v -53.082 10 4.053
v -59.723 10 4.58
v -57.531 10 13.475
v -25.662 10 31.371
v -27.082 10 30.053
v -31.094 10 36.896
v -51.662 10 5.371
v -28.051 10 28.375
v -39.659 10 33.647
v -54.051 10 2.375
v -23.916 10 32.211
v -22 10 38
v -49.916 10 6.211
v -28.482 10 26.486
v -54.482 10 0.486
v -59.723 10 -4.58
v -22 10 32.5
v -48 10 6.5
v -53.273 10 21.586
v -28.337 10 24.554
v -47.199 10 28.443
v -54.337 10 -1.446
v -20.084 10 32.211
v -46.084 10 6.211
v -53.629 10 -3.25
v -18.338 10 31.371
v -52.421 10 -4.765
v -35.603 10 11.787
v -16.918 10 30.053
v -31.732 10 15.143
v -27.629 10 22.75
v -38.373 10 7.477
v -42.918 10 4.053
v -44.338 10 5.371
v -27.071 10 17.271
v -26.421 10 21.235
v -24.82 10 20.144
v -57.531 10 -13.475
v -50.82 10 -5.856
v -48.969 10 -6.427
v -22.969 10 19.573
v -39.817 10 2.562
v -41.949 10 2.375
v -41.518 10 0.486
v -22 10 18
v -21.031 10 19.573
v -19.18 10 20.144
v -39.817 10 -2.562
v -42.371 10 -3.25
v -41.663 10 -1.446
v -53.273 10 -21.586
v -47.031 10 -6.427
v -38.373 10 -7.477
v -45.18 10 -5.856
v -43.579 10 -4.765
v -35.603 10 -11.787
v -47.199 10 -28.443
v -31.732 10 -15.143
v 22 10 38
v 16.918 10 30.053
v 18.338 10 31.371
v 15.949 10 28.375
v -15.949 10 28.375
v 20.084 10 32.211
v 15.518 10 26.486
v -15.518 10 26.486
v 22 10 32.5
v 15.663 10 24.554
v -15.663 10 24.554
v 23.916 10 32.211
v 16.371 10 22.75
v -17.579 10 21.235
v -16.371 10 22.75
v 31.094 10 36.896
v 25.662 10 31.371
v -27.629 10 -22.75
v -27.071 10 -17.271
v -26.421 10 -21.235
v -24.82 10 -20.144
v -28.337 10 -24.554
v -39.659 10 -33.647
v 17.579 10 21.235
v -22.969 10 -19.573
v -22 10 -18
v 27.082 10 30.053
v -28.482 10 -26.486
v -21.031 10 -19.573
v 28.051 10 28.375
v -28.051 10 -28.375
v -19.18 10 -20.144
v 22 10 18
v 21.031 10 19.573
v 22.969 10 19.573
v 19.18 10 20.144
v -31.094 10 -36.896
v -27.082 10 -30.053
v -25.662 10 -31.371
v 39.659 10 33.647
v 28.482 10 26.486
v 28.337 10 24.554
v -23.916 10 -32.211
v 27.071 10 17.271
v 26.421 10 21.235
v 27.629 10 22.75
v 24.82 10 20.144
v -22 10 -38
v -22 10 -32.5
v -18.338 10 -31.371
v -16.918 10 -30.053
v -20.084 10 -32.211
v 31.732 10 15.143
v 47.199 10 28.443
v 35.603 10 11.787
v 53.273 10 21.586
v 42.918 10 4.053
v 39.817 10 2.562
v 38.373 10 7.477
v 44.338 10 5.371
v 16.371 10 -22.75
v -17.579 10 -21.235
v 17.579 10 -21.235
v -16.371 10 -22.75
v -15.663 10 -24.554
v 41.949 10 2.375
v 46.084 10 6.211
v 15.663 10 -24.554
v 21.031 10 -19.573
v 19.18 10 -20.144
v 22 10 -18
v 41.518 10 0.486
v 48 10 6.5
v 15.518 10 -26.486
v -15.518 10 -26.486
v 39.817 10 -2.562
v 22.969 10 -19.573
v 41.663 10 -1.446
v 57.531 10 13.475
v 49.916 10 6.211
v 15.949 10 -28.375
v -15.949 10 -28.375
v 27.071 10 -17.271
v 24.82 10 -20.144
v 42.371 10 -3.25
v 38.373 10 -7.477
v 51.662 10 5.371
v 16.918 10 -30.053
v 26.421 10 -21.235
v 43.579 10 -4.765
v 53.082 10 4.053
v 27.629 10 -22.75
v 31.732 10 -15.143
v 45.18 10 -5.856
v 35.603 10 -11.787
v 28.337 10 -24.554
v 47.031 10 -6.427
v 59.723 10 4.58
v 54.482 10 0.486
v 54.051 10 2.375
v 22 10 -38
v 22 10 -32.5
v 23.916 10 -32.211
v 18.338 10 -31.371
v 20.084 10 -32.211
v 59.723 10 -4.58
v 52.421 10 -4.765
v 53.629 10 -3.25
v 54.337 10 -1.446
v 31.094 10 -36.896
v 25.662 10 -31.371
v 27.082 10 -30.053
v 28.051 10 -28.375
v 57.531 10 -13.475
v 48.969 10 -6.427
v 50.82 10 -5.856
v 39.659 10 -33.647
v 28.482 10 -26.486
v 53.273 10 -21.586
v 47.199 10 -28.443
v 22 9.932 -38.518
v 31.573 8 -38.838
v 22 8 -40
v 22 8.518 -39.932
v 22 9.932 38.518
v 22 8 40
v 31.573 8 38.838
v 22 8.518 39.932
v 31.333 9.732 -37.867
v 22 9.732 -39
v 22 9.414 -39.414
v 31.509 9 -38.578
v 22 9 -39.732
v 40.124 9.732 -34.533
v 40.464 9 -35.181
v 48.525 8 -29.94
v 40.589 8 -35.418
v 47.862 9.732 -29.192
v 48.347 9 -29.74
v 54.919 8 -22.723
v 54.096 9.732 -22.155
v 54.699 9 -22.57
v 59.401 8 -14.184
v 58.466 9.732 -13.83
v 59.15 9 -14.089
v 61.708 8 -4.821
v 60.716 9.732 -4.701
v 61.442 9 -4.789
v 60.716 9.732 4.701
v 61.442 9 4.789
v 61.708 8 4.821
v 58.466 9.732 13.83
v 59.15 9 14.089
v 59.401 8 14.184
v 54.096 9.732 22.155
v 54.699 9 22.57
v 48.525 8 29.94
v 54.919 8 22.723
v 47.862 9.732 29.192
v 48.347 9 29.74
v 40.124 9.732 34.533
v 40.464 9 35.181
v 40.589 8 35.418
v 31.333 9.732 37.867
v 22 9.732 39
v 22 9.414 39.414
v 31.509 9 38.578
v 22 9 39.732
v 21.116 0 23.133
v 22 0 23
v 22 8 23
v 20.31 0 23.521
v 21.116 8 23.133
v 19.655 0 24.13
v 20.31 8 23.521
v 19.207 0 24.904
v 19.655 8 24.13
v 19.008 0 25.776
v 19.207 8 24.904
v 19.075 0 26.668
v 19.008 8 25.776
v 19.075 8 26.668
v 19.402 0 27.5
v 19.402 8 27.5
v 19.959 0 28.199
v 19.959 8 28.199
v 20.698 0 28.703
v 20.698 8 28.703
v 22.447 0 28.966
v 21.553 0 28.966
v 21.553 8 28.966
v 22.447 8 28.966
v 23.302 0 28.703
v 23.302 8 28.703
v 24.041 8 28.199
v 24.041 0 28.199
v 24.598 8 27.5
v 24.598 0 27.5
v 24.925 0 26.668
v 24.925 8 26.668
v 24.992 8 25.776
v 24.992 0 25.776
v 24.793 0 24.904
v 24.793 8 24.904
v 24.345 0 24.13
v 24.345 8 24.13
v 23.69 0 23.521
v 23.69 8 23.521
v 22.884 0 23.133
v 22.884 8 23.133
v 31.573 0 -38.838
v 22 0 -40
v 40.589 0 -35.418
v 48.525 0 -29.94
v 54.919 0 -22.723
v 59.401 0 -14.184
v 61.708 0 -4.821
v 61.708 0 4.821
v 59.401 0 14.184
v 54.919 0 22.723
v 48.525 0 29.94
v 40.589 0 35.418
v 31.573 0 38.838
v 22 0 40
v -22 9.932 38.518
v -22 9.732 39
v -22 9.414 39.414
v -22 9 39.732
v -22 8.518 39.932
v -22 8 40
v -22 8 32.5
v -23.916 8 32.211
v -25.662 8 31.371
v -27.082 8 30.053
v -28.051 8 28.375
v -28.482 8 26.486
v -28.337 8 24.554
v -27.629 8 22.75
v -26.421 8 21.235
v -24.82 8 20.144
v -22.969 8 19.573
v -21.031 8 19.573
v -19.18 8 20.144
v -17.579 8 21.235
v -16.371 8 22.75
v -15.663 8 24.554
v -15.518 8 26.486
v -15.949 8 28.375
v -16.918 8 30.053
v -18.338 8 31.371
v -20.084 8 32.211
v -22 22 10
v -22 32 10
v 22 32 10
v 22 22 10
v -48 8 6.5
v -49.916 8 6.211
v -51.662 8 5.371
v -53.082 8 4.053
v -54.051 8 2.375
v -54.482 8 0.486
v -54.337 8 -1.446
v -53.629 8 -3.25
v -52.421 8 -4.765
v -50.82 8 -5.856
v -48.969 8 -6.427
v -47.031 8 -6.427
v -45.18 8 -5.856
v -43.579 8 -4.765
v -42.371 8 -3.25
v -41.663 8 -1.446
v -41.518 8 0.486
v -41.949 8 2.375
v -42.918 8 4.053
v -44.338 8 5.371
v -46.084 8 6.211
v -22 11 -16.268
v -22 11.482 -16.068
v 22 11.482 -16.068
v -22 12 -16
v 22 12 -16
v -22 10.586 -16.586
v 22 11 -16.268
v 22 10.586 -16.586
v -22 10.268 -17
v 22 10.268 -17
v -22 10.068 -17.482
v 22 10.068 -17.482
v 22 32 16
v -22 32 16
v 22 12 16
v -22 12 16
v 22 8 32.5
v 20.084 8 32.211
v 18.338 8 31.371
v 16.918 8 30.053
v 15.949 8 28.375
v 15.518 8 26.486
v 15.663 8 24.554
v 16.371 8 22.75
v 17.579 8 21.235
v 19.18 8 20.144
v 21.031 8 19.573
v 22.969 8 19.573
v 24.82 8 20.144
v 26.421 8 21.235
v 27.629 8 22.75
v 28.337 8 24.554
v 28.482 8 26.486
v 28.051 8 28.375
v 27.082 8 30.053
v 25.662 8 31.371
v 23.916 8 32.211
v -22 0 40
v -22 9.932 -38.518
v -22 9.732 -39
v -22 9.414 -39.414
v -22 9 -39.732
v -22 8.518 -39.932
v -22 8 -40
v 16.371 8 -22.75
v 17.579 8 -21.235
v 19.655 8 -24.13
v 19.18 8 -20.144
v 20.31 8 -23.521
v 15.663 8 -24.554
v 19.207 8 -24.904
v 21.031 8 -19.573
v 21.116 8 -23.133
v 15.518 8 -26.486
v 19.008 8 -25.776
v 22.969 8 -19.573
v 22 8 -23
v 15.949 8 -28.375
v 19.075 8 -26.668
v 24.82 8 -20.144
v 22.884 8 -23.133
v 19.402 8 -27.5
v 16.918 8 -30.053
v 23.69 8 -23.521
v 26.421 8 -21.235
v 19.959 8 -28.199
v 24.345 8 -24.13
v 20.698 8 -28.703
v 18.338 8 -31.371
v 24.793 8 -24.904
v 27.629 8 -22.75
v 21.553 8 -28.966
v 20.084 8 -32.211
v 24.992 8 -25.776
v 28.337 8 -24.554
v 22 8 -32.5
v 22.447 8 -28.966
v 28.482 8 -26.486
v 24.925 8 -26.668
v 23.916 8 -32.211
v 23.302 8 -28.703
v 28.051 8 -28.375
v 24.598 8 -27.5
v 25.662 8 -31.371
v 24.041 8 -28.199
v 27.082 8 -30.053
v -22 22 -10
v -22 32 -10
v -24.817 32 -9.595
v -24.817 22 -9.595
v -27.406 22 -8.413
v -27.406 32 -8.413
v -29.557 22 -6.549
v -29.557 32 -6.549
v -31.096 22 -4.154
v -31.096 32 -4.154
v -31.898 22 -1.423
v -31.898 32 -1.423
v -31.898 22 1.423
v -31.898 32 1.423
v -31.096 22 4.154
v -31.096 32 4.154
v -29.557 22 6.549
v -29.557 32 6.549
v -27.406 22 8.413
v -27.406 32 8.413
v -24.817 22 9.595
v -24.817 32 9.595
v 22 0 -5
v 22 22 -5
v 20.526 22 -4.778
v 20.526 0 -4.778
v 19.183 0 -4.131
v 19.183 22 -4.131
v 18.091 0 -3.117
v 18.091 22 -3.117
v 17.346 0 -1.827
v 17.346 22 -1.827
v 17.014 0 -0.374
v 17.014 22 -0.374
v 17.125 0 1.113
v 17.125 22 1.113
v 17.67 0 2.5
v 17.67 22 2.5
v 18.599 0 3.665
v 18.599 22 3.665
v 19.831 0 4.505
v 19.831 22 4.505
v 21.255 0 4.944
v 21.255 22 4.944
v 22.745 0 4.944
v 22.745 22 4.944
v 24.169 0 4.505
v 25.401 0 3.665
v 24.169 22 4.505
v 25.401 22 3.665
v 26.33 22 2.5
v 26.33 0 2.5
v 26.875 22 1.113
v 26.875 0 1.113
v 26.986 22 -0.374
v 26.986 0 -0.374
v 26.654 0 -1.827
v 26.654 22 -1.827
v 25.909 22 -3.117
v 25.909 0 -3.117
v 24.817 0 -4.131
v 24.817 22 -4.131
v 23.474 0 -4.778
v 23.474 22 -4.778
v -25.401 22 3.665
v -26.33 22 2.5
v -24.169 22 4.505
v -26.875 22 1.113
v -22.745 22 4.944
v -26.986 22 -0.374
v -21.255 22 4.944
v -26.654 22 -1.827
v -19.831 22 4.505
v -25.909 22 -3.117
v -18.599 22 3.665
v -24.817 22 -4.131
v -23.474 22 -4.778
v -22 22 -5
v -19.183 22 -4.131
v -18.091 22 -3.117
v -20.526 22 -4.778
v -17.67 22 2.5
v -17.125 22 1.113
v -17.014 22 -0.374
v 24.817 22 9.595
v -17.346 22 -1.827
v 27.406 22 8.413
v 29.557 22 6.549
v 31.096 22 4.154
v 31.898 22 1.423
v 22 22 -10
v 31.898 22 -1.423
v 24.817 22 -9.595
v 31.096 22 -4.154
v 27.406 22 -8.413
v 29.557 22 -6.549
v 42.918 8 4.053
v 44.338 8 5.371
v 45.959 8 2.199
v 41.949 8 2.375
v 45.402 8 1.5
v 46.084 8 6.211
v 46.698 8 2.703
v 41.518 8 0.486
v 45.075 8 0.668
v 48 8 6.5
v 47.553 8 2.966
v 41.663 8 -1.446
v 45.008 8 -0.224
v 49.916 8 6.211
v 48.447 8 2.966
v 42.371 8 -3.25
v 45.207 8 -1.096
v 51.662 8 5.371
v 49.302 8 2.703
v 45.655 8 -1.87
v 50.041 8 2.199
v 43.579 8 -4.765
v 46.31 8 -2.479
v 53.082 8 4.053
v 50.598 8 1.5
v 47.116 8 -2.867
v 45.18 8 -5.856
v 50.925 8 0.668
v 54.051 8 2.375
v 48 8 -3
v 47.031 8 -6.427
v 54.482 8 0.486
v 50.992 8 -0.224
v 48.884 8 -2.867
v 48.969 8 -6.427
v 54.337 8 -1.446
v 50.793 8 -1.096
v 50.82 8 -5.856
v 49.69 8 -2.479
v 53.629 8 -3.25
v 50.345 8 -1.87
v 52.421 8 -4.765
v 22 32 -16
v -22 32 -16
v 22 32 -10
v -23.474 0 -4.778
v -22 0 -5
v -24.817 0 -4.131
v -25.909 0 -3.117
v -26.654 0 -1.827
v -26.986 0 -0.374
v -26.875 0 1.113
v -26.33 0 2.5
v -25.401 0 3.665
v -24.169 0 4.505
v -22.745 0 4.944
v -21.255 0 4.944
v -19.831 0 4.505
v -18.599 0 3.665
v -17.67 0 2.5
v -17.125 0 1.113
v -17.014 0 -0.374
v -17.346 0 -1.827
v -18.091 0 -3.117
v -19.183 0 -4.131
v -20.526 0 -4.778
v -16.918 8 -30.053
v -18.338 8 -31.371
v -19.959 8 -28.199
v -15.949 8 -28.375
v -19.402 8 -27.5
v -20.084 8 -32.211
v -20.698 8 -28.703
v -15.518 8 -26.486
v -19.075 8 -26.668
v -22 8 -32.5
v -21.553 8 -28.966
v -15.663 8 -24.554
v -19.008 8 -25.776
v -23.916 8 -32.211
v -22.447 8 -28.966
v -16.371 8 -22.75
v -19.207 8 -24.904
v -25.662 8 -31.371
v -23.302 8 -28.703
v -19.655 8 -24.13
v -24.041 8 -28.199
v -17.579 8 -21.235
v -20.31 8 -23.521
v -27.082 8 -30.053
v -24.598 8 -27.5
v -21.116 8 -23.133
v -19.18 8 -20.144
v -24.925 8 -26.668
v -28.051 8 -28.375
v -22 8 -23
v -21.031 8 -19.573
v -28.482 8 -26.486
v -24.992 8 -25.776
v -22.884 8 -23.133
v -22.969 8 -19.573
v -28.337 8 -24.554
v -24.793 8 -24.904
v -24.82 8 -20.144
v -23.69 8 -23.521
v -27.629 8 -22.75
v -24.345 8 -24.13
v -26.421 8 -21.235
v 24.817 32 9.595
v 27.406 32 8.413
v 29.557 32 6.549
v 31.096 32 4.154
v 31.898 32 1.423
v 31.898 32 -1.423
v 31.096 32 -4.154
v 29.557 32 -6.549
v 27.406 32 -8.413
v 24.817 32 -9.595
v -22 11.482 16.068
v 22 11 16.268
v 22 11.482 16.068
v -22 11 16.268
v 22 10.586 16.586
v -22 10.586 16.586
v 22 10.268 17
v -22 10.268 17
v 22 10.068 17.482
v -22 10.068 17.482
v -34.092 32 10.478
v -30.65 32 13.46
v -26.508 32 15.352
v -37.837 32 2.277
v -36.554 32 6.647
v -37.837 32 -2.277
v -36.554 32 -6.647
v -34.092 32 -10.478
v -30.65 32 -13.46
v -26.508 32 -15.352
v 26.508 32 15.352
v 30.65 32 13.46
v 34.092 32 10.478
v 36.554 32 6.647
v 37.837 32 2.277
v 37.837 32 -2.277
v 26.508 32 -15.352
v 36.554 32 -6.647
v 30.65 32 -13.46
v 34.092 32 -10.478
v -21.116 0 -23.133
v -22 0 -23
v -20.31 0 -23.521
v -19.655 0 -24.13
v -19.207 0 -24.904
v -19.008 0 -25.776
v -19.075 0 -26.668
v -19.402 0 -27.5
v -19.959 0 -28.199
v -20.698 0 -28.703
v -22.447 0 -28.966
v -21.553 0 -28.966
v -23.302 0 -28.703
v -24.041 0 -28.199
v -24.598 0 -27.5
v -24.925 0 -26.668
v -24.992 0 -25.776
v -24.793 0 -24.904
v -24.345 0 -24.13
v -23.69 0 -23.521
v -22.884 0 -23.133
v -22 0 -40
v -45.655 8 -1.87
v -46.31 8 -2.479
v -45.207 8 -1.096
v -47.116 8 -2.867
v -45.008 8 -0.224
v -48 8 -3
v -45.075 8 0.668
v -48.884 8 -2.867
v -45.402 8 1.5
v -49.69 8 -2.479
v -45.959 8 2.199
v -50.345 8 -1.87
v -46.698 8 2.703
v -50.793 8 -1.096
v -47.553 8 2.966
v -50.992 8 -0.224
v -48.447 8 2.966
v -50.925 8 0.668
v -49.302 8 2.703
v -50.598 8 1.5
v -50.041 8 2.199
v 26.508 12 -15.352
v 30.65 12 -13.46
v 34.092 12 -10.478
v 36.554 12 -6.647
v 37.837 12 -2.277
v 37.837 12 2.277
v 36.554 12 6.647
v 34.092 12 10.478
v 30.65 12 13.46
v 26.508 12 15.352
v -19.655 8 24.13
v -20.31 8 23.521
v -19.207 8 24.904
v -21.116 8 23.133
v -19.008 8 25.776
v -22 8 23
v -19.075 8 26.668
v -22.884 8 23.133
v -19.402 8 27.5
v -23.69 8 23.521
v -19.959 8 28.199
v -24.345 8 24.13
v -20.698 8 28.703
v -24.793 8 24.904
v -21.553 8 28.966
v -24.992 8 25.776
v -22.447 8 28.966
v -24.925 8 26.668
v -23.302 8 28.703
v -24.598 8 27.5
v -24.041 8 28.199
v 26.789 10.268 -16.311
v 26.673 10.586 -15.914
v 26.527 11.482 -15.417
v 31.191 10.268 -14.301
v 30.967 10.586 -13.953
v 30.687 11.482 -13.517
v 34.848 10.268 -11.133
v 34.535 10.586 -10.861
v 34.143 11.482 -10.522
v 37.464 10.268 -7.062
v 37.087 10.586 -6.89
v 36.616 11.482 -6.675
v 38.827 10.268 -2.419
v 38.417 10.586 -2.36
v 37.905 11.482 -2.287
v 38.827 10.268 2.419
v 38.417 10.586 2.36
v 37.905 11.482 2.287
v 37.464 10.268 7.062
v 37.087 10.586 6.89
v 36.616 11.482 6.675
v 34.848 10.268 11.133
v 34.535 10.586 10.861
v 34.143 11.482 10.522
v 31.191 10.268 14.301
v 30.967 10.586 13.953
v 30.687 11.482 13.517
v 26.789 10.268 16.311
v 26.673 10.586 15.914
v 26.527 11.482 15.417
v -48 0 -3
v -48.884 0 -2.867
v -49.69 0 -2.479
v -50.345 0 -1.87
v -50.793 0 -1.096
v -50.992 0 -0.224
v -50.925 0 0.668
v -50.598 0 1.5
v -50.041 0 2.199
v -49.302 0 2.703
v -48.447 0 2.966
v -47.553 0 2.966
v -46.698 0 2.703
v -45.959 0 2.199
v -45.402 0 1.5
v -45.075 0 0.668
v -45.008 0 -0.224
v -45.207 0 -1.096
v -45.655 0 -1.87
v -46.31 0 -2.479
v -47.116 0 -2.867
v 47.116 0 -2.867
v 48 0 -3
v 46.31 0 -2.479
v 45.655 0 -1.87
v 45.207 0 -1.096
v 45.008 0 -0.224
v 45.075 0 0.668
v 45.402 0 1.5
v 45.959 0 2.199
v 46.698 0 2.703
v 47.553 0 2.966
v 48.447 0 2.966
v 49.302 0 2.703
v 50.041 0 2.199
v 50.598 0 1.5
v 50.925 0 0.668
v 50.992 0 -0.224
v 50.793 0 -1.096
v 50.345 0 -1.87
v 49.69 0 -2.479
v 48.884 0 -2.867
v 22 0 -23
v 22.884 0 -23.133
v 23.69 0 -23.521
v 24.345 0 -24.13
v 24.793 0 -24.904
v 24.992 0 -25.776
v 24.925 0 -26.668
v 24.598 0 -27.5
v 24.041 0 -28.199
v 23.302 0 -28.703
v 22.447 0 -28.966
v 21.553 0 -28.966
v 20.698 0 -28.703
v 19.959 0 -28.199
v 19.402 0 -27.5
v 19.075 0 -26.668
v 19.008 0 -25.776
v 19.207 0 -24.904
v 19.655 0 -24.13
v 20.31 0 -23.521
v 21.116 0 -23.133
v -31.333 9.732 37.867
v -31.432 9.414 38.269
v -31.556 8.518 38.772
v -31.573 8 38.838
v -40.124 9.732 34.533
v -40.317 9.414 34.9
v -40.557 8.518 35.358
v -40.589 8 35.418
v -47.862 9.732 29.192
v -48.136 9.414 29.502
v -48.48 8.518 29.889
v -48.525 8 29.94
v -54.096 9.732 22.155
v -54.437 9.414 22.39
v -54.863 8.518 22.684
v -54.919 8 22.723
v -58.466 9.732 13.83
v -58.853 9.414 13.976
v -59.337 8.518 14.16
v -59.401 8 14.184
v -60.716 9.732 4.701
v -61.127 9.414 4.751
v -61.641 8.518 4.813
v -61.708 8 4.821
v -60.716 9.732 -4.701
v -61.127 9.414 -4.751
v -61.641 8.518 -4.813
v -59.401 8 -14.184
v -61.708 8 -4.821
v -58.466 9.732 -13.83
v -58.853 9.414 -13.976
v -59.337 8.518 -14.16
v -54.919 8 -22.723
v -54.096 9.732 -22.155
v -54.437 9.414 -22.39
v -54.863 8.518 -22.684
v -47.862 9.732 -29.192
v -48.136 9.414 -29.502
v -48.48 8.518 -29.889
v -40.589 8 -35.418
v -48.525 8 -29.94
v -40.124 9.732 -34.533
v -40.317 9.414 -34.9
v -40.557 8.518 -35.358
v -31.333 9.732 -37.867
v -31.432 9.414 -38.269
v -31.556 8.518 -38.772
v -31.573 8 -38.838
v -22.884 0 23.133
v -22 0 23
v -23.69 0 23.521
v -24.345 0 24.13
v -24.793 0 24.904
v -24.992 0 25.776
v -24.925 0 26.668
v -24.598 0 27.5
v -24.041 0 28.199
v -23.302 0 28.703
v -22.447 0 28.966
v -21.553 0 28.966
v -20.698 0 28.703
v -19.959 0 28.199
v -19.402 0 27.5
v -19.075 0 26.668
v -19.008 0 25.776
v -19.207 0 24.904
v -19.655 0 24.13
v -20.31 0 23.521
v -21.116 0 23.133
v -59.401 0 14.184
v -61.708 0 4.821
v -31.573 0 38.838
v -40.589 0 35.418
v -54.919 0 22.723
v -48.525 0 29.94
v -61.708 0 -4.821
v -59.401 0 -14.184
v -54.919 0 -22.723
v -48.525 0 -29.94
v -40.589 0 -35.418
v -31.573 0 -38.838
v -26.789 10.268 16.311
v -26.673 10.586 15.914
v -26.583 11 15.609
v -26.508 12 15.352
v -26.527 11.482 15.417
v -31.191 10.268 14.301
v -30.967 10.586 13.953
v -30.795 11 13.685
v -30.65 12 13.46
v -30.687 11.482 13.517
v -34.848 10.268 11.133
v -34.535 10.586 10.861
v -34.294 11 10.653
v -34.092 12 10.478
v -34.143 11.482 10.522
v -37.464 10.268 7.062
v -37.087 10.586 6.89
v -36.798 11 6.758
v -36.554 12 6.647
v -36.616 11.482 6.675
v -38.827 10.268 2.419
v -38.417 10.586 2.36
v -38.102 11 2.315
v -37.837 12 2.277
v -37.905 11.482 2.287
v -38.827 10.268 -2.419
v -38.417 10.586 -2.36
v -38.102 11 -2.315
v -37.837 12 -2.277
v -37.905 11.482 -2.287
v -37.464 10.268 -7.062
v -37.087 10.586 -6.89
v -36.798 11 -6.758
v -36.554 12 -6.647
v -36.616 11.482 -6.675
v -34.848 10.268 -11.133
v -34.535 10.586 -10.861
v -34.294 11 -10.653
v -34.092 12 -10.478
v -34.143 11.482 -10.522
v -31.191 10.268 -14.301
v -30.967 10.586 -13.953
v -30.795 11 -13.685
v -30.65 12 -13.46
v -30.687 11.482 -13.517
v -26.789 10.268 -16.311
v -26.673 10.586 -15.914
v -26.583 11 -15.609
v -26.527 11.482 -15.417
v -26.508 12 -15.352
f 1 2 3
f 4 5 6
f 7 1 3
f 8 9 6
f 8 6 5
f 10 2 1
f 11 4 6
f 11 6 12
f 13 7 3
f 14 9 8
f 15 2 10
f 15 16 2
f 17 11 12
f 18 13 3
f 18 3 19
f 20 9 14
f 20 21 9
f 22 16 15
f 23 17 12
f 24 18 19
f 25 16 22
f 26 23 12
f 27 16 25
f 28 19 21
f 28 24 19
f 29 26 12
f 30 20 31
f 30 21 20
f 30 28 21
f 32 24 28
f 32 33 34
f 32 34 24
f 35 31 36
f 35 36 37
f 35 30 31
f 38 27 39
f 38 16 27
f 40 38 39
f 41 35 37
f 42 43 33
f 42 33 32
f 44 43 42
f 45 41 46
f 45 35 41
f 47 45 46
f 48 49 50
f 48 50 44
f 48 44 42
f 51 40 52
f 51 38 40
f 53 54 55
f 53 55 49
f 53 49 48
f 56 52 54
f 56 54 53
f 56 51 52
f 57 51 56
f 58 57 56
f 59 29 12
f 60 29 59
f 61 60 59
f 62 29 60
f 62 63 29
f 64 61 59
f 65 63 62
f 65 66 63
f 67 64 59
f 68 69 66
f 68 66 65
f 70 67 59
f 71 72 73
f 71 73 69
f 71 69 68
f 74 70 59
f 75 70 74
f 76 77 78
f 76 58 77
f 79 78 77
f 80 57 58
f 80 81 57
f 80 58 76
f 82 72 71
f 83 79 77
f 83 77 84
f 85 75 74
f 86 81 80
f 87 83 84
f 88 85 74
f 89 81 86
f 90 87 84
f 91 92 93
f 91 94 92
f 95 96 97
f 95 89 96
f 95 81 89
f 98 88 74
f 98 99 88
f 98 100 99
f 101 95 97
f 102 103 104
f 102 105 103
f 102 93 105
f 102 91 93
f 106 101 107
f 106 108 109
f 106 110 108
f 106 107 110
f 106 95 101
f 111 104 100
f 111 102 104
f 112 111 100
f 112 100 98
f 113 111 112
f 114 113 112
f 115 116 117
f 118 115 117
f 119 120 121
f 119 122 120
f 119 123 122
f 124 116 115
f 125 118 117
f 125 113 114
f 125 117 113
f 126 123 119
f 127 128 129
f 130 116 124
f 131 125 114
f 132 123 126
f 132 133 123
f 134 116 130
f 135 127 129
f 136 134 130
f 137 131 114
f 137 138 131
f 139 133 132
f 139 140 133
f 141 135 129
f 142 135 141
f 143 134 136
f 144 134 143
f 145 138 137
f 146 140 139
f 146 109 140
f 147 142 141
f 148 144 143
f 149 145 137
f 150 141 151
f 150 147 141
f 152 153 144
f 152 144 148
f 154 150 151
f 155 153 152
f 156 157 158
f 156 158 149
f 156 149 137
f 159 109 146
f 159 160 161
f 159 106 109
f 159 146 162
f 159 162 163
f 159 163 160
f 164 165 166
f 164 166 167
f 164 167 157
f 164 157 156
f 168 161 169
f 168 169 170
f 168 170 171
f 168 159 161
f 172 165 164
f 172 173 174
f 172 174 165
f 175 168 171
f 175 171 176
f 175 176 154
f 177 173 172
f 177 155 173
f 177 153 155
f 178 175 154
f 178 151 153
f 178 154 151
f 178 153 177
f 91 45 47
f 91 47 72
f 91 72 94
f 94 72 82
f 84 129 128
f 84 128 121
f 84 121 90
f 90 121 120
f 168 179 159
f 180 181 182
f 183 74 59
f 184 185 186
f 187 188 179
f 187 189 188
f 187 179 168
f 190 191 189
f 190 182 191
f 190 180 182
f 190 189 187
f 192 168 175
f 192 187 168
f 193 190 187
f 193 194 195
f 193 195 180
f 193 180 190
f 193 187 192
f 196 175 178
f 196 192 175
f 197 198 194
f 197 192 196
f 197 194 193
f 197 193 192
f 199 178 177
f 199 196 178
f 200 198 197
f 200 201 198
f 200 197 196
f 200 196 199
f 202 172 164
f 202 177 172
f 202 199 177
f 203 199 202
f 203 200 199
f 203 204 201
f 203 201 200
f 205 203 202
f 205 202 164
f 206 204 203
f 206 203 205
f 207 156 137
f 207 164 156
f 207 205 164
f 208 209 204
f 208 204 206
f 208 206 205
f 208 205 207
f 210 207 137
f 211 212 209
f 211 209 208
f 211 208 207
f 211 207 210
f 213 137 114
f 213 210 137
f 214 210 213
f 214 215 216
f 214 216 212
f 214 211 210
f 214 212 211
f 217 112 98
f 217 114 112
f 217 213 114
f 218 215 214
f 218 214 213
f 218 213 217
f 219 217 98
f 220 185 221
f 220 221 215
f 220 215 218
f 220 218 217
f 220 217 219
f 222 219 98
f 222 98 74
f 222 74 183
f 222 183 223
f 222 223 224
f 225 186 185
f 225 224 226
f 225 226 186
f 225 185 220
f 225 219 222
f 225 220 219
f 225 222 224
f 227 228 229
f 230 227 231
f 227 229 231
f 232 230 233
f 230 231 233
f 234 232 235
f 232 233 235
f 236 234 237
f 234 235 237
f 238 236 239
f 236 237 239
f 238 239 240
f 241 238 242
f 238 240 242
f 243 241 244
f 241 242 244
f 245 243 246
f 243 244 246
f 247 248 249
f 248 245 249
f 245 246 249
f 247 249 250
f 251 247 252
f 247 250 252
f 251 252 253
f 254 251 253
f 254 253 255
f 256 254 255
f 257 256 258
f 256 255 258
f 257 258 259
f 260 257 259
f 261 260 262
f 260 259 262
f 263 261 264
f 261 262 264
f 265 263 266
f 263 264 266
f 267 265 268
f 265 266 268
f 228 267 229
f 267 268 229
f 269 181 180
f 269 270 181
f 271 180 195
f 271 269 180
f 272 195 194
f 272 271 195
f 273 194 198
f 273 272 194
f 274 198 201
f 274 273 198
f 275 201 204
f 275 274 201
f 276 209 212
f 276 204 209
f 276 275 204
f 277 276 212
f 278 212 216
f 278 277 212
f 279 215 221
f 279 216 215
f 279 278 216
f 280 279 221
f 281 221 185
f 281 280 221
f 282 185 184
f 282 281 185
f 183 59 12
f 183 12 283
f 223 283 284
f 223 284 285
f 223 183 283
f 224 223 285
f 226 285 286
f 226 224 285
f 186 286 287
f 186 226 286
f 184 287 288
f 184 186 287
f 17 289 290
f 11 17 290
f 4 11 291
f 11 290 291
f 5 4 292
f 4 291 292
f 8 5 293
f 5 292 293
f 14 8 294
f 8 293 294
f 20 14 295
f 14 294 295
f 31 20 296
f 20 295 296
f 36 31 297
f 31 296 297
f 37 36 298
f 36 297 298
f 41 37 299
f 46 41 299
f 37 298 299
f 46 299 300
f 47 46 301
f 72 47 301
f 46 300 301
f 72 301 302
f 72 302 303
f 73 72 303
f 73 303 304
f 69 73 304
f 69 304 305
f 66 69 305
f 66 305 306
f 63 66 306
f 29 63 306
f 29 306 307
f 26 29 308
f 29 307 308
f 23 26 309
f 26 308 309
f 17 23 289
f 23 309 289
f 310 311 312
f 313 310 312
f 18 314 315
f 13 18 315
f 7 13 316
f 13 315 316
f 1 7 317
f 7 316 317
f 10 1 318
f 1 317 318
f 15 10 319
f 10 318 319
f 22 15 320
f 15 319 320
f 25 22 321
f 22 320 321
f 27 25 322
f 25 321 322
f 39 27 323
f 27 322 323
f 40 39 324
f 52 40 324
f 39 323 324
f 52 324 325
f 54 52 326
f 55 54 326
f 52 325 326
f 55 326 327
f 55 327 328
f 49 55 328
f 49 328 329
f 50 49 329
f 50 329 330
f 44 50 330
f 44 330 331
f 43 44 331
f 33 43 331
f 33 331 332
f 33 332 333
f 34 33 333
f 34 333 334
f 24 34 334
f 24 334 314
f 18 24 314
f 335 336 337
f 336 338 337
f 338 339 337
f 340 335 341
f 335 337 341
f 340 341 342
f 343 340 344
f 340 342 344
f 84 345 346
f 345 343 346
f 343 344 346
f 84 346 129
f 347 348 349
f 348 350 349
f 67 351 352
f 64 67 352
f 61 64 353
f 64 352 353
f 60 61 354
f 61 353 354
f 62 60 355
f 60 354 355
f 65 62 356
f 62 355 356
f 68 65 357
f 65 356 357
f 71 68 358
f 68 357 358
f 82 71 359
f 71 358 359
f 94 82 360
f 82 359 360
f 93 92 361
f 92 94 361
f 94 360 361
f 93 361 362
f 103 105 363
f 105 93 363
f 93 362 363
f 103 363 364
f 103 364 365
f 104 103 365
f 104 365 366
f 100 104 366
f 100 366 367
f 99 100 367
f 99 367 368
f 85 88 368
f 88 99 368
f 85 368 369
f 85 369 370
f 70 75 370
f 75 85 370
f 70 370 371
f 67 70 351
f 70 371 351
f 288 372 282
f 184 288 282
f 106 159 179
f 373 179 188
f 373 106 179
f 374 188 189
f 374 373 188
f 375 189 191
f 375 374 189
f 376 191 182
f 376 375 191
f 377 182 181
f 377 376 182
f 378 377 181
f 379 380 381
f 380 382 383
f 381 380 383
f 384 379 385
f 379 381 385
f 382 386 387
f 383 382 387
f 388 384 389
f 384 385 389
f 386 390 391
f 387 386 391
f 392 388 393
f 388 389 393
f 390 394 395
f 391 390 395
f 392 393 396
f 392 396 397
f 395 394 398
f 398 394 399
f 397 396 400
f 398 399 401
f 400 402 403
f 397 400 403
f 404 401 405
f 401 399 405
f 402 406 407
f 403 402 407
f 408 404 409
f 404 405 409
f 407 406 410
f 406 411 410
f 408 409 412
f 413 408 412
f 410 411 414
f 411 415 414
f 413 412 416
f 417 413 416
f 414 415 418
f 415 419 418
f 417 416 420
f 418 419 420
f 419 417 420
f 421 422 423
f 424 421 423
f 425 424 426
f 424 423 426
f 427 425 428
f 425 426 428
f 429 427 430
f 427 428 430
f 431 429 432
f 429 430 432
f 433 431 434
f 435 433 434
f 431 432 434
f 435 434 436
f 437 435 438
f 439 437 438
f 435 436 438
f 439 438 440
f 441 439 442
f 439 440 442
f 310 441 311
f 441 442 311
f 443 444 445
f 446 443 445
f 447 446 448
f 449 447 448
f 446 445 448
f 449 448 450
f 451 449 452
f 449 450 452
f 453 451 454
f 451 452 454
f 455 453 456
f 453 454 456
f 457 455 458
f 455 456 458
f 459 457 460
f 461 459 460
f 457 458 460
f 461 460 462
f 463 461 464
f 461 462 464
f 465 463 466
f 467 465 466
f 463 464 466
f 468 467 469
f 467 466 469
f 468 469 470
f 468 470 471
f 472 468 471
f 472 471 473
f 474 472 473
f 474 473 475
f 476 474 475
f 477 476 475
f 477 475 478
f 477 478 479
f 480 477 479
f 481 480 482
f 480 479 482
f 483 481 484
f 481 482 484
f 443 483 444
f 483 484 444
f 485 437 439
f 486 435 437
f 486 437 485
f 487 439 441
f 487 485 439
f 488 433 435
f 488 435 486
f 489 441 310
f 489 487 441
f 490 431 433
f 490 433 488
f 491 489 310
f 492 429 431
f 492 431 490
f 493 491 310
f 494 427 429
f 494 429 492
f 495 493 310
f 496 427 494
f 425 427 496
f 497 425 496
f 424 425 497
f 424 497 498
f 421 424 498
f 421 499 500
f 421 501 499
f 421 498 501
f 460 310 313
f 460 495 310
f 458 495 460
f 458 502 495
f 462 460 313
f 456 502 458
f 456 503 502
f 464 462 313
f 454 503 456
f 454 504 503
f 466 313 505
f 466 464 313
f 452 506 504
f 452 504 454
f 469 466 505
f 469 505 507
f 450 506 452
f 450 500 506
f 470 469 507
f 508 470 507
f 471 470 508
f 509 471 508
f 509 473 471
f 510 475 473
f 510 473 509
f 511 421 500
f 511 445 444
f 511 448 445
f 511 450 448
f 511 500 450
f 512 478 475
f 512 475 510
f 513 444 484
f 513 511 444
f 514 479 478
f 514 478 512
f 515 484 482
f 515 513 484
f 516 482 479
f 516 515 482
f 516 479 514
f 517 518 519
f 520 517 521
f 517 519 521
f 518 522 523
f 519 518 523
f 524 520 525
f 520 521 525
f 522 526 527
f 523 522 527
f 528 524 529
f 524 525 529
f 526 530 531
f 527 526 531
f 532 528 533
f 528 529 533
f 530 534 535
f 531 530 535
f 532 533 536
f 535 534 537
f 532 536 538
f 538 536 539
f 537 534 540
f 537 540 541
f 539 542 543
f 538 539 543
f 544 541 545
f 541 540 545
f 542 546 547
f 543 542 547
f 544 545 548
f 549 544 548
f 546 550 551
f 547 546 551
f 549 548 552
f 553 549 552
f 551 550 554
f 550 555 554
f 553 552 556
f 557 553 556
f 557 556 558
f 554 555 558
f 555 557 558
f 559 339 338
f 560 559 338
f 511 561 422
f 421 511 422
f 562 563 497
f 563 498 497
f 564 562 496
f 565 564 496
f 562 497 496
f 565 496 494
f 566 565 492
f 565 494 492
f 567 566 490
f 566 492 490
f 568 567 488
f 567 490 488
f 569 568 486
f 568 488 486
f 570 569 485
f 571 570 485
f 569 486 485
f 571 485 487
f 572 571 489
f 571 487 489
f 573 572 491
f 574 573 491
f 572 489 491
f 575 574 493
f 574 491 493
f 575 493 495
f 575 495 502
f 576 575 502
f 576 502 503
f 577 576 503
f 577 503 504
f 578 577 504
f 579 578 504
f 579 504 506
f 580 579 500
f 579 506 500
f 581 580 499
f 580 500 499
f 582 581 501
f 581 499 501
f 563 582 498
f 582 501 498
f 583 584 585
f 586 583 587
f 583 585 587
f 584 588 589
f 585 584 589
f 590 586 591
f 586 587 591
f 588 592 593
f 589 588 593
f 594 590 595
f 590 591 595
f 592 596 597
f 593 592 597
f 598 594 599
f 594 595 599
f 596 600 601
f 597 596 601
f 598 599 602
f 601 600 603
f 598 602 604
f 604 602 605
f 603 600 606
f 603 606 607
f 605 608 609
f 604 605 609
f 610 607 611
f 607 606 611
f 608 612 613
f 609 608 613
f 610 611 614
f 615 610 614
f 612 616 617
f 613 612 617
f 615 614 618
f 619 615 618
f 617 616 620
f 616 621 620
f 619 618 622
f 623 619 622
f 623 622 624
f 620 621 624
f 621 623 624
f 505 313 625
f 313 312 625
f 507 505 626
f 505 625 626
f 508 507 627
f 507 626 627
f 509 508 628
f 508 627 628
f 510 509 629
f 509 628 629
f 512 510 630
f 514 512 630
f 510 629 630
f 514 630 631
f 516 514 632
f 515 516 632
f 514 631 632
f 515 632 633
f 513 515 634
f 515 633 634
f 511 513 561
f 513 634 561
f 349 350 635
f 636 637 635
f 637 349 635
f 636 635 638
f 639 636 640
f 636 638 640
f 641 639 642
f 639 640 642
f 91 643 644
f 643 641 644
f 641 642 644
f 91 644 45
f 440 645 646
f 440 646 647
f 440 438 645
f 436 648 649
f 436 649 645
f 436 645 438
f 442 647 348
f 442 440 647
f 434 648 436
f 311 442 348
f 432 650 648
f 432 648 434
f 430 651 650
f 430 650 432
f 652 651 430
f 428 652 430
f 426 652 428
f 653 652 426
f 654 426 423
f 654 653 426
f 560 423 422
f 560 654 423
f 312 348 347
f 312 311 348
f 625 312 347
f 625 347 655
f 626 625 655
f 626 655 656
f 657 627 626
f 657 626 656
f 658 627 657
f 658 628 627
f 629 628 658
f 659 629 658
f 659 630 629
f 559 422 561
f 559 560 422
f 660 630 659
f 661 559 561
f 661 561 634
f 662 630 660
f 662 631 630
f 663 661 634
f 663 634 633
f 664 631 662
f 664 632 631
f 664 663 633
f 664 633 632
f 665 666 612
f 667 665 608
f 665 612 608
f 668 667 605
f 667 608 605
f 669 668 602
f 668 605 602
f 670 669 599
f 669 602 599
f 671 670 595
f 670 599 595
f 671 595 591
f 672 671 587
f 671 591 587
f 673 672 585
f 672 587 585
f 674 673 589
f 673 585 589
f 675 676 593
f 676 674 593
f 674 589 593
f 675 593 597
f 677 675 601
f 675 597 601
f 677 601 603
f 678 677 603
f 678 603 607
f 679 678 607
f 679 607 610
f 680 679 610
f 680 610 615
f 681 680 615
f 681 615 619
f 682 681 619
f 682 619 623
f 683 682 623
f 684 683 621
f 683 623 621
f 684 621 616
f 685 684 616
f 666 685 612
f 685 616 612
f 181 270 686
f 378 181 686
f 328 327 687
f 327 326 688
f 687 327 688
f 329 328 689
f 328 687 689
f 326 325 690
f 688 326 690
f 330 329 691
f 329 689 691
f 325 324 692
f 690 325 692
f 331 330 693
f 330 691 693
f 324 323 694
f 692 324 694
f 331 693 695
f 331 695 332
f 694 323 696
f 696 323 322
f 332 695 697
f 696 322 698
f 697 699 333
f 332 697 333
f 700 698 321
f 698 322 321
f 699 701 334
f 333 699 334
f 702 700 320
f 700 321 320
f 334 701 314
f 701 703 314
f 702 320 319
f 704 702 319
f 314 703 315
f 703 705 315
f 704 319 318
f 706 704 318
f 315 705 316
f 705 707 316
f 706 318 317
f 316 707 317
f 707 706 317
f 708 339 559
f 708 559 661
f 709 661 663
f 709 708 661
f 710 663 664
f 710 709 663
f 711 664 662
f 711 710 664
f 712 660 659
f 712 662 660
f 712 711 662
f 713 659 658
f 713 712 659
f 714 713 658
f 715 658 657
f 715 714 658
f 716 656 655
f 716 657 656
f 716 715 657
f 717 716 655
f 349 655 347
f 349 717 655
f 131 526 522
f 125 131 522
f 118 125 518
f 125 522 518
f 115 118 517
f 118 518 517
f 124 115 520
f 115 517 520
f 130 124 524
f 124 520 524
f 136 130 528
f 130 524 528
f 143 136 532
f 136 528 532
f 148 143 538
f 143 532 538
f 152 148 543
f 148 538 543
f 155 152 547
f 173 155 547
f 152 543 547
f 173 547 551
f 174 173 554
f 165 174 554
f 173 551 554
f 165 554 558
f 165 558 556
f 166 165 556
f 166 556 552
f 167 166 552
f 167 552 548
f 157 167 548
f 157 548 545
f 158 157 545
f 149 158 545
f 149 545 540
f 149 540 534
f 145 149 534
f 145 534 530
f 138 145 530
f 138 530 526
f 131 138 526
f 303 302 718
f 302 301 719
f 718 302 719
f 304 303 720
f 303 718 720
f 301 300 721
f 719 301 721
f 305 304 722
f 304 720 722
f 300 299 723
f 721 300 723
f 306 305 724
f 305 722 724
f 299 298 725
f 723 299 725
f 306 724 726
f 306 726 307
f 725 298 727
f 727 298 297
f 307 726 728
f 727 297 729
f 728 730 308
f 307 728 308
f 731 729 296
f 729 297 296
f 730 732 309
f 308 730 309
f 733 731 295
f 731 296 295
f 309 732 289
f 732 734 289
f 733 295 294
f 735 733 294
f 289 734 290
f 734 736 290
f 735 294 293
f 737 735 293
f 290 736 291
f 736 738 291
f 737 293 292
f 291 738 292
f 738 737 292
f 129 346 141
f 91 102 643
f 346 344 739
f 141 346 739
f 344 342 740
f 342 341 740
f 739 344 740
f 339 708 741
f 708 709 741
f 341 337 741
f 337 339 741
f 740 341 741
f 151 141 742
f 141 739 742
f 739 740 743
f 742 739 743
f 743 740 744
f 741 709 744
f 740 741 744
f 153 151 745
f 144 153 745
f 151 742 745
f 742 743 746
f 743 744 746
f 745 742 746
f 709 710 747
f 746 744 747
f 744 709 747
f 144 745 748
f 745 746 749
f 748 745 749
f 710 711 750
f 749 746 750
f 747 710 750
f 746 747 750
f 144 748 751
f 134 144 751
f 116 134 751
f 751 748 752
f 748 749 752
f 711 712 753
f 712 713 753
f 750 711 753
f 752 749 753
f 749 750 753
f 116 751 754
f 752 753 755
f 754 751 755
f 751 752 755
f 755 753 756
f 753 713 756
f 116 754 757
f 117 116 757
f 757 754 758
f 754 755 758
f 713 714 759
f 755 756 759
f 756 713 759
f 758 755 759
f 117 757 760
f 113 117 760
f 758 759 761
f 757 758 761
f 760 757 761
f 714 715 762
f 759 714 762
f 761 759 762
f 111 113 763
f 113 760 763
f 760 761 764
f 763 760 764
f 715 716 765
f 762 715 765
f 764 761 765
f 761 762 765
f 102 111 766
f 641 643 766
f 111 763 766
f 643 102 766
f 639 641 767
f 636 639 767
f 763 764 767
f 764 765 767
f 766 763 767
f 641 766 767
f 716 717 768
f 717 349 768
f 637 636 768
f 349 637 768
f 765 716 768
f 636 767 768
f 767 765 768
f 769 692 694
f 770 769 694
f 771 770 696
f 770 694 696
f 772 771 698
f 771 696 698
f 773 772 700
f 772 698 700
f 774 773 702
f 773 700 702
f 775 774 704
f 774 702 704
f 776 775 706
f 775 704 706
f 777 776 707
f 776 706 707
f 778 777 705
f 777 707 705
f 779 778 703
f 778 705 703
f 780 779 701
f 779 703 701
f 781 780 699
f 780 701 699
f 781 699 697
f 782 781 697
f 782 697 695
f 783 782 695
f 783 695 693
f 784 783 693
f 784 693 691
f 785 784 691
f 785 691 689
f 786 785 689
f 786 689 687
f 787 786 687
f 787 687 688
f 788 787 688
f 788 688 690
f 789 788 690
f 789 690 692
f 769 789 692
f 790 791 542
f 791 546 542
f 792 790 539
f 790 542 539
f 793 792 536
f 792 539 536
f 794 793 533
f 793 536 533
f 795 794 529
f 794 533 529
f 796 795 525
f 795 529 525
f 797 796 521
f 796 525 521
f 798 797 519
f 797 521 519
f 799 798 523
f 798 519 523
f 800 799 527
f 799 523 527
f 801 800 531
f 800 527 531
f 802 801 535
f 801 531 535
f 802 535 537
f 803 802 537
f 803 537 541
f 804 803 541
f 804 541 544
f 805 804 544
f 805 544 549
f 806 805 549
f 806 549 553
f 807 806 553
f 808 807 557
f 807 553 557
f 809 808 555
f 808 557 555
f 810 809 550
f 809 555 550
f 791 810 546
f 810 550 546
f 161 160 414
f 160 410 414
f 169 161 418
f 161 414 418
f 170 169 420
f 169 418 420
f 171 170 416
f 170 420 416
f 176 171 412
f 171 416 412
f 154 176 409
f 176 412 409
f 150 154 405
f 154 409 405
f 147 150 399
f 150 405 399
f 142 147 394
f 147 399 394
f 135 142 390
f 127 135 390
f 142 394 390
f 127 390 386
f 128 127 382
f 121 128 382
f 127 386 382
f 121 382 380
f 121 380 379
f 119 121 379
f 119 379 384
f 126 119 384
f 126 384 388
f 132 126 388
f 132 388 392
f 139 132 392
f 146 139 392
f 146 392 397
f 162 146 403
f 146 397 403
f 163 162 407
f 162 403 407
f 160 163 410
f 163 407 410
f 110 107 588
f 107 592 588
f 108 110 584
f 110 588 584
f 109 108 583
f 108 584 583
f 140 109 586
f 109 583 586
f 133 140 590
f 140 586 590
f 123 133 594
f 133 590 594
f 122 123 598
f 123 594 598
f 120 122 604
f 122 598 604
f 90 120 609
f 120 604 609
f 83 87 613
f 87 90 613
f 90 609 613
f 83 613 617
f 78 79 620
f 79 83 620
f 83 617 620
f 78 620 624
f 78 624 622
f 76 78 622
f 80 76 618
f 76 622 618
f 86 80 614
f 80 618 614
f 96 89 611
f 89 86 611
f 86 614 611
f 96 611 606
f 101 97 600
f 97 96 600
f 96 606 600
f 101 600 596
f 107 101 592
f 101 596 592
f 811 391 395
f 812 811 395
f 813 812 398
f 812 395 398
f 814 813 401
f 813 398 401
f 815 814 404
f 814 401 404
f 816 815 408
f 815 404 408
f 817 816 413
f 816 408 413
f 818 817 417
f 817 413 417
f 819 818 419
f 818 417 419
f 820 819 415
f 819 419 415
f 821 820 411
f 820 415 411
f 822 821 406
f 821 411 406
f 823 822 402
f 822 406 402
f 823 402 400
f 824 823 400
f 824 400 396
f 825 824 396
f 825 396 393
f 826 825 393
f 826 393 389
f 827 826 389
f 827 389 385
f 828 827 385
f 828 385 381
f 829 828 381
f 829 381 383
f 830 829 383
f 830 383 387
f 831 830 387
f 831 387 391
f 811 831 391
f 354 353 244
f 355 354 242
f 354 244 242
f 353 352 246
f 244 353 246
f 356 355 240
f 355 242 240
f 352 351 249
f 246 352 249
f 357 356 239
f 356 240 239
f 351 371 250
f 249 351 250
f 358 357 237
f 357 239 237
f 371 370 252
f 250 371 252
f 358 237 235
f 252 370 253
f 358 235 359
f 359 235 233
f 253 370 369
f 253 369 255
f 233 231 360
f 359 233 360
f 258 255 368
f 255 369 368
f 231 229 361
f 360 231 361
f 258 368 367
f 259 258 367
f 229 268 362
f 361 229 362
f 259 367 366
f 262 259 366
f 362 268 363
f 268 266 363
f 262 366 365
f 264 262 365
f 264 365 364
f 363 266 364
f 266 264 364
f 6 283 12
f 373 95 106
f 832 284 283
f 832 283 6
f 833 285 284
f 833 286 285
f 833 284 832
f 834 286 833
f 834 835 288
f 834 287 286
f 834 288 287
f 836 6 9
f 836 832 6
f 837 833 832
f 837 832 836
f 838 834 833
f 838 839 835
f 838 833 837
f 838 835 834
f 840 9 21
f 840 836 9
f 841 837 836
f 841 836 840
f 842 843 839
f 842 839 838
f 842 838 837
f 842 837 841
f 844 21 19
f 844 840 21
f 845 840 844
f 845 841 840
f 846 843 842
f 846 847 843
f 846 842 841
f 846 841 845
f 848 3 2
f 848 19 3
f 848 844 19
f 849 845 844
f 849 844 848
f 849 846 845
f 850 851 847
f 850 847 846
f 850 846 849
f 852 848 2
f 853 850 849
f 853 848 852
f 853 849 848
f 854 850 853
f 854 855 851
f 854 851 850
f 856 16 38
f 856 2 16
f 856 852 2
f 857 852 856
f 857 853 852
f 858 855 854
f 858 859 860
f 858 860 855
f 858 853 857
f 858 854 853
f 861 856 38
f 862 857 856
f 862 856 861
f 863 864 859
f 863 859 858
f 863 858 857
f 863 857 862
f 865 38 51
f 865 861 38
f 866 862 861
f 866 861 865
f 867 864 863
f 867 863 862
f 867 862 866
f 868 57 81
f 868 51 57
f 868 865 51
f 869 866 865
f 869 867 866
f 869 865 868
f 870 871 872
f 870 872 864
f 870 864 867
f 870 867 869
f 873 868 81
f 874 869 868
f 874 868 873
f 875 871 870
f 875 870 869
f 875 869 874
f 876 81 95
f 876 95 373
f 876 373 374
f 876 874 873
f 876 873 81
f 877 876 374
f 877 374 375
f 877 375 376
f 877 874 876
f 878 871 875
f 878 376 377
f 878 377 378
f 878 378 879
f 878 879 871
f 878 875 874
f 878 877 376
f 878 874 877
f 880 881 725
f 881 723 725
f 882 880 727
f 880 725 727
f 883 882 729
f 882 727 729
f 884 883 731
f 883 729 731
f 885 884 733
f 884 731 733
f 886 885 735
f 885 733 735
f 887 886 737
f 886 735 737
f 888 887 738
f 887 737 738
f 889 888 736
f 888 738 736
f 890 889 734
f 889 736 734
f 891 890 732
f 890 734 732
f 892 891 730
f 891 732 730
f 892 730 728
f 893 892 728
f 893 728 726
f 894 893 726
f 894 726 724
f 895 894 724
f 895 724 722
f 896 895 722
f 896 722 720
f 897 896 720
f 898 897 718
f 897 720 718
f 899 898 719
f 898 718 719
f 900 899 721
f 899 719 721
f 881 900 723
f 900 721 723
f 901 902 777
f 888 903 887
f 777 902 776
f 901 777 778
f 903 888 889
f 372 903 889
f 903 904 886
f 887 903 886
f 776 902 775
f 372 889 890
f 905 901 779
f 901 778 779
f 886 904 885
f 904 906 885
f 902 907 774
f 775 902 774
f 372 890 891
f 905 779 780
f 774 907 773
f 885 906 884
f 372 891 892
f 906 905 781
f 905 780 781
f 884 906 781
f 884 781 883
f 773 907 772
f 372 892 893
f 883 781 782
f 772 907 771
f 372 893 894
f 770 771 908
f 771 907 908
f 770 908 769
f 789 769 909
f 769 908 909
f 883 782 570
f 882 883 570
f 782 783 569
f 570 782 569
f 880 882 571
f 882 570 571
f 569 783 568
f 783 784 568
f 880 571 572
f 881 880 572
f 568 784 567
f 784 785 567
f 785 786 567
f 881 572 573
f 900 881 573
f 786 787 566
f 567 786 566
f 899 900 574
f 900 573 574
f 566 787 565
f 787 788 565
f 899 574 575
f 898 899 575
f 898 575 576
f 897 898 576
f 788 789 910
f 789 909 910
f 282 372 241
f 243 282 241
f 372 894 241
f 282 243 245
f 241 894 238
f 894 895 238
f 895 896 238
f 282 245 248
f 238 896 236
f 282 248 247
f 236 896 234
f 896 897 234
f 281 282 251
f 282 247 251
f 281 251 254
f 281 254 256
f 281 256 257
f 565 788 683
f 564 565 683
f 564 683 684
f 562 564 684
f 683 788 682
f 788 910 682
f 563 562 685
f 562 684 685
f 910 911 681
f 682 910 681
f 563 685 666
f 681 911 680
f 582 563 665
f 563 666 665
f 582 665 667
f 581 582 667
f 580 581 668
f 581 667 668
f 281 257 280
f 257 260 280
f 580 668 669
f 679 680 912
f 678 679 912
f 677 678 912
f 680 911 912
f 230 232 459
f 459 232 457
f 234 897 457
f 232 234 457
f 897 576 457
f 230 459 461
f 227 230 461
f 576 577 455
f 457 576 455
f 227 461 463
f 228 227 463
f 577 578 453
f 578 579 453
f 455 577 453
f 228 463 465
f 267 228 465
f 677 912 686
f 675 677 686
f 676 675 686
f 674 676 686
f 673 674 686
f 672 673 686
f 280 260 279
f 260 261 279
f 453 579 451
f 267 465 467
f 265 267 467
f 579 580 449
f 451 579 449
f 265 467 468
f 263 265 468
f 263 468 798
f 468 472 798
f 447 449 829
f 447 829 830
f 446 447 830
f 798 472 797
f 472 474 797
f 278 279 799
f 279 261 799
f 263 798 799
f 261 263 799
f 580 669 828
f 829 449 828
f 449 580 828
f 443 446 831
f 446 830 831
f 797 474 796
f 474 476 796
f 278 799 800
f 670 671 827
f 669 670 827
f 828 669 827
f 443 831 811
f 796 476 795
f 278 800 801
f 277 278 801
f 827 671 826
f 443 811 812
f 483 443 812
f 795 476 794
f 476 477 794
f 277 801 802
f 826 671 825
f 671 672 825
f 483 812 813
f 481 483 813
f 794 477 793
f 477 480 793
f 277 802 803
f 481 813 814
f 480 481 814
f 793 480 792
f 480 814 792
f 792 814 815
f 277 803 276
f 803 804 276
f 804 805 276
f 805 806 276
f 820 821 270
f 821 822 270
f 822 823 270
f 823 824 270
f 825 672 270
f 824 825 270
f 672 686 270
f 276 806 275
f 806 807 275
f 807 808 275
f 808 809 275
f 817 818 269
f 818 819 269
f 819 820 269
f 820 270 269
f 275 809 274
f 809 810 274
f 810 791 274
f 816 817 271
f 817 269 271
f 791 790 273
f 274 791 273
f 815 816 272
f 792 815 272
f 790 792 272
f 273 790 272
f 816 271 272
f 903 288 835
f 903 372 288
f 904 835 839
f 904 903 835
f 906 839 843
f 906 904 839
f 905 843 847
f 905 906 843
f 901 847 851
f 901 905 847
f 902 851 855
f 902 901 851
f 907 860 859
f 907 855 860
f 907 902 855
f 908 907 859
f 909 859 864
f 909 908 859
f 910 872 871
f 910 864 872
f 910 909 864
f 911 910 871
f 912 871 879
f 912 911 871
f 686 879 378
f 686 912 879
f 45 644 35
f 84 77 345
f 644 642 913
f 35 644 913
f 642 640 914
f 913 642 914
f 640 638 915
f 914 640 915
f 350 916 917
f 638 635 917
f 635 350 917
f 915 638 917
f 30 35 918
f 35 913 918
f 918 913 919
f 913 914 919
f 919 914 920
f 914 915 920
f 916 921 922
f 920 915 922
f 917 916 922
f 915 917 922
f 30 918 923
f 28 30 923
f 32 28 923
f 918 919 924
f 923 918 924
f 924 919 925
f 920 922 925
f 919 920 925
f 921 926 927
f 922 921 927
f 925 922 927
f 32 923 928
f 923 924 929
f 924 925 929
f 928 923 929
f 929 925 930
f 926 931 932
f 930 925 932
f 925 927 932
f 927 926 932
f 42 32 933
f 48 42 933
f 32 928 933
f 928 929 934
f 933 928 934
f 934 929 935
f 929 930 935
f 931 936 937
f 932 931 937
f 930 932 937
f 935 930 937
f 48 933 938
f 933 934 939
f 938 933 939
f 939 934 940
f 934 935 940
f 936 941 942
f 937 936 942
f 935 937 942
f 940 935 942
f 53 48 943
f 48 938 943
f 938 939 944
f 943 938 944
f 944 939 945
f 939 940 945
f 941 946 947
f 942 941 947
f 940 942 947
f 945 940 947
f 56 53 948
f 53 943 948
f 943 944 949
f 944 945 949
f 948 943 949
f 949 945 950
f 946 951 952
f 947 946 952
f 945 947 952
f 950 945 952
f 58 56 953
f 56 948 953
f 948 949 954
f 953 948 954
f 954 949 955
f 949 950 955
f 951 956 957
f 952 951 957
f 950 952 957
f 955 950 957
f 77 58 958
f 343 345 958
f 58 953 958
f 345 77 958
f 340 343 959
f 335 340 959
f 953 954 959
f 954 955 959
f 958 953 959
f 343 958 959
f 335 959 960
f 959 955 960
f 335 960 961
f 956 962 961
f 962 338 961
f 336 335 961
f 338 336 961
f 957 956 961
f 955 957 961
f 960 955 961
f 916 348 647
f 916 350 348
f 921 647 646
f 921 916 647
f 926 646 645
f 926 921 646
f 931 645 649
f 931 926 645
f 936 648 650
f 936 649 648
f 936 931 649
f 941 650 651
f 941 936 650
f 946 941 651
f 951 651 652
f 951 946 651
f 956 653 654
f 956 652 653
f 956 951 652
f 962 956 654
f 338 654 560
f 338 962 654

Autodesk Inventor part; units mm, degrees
ref_plane "YZ Plane" through (0, 0, 0) normal (1, 0, 0) x (0, 1, 0)
ref_plane "XZ Plane" through (0, 0, 0) normal (0, 1, 0) x (-1, 0, 0)
ref_plane "XY Plane" through (0, 0, 0) normal (0, 0, 1) x (1, 0, 0)
sketch "Sketch1" plane through (0, 0, 0) normal (0, 0, 1) x (1, 0, 0)
  line L0 (-22, 0) -> (22, 0) construction
  line L1 (-22, -40) -> (22, -40)
  line L2 (22, 40) -> (-22, 40)
  arc A0 (-22, 40) -> (-22, -40) centre (-22, 0) ccw
  arc A1 (22, -40) -> (22, 40) centre (22, 0) ccw
  line L3 (-22, 0) -> (22, 0) construction
  line L4 (-22, -16) -> (22, -16)
  line L5 (22, 16) -> (-22, 16)
  arc A2 (-22, 16) -> (-22, -16) centre (-22, 0) ccw
  arc A3 (22, -16) -> (22, 16) centre (22, 0) ccw
  line L6 (22, 10) -> (-22, 10)
  arc A4 (-22, 10) -> (-22, -10) centre (-22, 0) ccw
  line L7 (-22, -10) -> (22, -10)
  arc A5 (22, -10) -> (22, 10) centre (22, 0) ccw
  point P0 (0, 0)
  point P1 (0, 0)
  point P2 (62, 0)
  point P3 (-62, 0)
  point P4 (0, 0)
  point P5 (38, 0)
  point P6 (-38, 0)
  point P7 (-48, 0)
  point P8 (-22, -26)
  dimension "d1" = 124
  dimension "d2" = 76
  dimension "d3" = 80
  dimension "d4" = 16
  dimension "d5" = 10
  dimension "d6" = 26
  dimension "d7" = 26
extrude "Extrusion1" add sketch "Sketch1" along normal blind 10 contours A0 L2 A1 L1 | A2 L5 A3 L4 | A5 L7 A4 L6
extrude "Extrusion2" add sketch "Sketch1" along normal blind 32 contours A2 L5 A3 L4 | A5 L7 A4 L6
extrude "Extrusion3" cut sketch "Sketch1" against normal blind 10 from surface at 32 contours A5 L7 A4 L6
hole "Hole1" at (-22, -26, 0) at (-48, 0, 0) direction (0, 0, 1) diameter 6 depth 10
sketch "Sketch2" plane through (0, 0, 10) normal (0, 0, 1) x (1, 0, 0)
  circle A0 centre (-48, 0) radius 3 projected
  circle A1 centre (-22, -26) radius 3 projected
  point P0 (0, 0)
hole "Hole2" at (-48, 0, 10) at (-22, -26, 10) direction (0, 0, -1) diameter 13 depth 2
hole "Hole3" at (-22, 0, 0) direction (0, 0, 1) diameter 10 depth 22
mirror "Mirror1" about plane through (0, 0, 0) normal (1, 0, 0) of "Hole2", "Hole3", "Hole1"
mirror "Mirror2" about plane through (0, 0, 0) normal (0, 1, 0) of "Hole2", "Hole1", "Hole3", "Mirror1"
fillet "Fillet1" radius 2 8 edges at (62, 0, 10) (0, 40, 10) (-62, 0, 10) (0, -40, 10) (0, -16, 10) (-38, 0, 10) (0, 16, 10) (38, 0, 10)
move or copy body "Rotate1" bodies to move or copy 1 copy no rotation origin (0, 0, 0) rotation axis (1, 0, 0) rotation angle -90
properties part number "b2"
